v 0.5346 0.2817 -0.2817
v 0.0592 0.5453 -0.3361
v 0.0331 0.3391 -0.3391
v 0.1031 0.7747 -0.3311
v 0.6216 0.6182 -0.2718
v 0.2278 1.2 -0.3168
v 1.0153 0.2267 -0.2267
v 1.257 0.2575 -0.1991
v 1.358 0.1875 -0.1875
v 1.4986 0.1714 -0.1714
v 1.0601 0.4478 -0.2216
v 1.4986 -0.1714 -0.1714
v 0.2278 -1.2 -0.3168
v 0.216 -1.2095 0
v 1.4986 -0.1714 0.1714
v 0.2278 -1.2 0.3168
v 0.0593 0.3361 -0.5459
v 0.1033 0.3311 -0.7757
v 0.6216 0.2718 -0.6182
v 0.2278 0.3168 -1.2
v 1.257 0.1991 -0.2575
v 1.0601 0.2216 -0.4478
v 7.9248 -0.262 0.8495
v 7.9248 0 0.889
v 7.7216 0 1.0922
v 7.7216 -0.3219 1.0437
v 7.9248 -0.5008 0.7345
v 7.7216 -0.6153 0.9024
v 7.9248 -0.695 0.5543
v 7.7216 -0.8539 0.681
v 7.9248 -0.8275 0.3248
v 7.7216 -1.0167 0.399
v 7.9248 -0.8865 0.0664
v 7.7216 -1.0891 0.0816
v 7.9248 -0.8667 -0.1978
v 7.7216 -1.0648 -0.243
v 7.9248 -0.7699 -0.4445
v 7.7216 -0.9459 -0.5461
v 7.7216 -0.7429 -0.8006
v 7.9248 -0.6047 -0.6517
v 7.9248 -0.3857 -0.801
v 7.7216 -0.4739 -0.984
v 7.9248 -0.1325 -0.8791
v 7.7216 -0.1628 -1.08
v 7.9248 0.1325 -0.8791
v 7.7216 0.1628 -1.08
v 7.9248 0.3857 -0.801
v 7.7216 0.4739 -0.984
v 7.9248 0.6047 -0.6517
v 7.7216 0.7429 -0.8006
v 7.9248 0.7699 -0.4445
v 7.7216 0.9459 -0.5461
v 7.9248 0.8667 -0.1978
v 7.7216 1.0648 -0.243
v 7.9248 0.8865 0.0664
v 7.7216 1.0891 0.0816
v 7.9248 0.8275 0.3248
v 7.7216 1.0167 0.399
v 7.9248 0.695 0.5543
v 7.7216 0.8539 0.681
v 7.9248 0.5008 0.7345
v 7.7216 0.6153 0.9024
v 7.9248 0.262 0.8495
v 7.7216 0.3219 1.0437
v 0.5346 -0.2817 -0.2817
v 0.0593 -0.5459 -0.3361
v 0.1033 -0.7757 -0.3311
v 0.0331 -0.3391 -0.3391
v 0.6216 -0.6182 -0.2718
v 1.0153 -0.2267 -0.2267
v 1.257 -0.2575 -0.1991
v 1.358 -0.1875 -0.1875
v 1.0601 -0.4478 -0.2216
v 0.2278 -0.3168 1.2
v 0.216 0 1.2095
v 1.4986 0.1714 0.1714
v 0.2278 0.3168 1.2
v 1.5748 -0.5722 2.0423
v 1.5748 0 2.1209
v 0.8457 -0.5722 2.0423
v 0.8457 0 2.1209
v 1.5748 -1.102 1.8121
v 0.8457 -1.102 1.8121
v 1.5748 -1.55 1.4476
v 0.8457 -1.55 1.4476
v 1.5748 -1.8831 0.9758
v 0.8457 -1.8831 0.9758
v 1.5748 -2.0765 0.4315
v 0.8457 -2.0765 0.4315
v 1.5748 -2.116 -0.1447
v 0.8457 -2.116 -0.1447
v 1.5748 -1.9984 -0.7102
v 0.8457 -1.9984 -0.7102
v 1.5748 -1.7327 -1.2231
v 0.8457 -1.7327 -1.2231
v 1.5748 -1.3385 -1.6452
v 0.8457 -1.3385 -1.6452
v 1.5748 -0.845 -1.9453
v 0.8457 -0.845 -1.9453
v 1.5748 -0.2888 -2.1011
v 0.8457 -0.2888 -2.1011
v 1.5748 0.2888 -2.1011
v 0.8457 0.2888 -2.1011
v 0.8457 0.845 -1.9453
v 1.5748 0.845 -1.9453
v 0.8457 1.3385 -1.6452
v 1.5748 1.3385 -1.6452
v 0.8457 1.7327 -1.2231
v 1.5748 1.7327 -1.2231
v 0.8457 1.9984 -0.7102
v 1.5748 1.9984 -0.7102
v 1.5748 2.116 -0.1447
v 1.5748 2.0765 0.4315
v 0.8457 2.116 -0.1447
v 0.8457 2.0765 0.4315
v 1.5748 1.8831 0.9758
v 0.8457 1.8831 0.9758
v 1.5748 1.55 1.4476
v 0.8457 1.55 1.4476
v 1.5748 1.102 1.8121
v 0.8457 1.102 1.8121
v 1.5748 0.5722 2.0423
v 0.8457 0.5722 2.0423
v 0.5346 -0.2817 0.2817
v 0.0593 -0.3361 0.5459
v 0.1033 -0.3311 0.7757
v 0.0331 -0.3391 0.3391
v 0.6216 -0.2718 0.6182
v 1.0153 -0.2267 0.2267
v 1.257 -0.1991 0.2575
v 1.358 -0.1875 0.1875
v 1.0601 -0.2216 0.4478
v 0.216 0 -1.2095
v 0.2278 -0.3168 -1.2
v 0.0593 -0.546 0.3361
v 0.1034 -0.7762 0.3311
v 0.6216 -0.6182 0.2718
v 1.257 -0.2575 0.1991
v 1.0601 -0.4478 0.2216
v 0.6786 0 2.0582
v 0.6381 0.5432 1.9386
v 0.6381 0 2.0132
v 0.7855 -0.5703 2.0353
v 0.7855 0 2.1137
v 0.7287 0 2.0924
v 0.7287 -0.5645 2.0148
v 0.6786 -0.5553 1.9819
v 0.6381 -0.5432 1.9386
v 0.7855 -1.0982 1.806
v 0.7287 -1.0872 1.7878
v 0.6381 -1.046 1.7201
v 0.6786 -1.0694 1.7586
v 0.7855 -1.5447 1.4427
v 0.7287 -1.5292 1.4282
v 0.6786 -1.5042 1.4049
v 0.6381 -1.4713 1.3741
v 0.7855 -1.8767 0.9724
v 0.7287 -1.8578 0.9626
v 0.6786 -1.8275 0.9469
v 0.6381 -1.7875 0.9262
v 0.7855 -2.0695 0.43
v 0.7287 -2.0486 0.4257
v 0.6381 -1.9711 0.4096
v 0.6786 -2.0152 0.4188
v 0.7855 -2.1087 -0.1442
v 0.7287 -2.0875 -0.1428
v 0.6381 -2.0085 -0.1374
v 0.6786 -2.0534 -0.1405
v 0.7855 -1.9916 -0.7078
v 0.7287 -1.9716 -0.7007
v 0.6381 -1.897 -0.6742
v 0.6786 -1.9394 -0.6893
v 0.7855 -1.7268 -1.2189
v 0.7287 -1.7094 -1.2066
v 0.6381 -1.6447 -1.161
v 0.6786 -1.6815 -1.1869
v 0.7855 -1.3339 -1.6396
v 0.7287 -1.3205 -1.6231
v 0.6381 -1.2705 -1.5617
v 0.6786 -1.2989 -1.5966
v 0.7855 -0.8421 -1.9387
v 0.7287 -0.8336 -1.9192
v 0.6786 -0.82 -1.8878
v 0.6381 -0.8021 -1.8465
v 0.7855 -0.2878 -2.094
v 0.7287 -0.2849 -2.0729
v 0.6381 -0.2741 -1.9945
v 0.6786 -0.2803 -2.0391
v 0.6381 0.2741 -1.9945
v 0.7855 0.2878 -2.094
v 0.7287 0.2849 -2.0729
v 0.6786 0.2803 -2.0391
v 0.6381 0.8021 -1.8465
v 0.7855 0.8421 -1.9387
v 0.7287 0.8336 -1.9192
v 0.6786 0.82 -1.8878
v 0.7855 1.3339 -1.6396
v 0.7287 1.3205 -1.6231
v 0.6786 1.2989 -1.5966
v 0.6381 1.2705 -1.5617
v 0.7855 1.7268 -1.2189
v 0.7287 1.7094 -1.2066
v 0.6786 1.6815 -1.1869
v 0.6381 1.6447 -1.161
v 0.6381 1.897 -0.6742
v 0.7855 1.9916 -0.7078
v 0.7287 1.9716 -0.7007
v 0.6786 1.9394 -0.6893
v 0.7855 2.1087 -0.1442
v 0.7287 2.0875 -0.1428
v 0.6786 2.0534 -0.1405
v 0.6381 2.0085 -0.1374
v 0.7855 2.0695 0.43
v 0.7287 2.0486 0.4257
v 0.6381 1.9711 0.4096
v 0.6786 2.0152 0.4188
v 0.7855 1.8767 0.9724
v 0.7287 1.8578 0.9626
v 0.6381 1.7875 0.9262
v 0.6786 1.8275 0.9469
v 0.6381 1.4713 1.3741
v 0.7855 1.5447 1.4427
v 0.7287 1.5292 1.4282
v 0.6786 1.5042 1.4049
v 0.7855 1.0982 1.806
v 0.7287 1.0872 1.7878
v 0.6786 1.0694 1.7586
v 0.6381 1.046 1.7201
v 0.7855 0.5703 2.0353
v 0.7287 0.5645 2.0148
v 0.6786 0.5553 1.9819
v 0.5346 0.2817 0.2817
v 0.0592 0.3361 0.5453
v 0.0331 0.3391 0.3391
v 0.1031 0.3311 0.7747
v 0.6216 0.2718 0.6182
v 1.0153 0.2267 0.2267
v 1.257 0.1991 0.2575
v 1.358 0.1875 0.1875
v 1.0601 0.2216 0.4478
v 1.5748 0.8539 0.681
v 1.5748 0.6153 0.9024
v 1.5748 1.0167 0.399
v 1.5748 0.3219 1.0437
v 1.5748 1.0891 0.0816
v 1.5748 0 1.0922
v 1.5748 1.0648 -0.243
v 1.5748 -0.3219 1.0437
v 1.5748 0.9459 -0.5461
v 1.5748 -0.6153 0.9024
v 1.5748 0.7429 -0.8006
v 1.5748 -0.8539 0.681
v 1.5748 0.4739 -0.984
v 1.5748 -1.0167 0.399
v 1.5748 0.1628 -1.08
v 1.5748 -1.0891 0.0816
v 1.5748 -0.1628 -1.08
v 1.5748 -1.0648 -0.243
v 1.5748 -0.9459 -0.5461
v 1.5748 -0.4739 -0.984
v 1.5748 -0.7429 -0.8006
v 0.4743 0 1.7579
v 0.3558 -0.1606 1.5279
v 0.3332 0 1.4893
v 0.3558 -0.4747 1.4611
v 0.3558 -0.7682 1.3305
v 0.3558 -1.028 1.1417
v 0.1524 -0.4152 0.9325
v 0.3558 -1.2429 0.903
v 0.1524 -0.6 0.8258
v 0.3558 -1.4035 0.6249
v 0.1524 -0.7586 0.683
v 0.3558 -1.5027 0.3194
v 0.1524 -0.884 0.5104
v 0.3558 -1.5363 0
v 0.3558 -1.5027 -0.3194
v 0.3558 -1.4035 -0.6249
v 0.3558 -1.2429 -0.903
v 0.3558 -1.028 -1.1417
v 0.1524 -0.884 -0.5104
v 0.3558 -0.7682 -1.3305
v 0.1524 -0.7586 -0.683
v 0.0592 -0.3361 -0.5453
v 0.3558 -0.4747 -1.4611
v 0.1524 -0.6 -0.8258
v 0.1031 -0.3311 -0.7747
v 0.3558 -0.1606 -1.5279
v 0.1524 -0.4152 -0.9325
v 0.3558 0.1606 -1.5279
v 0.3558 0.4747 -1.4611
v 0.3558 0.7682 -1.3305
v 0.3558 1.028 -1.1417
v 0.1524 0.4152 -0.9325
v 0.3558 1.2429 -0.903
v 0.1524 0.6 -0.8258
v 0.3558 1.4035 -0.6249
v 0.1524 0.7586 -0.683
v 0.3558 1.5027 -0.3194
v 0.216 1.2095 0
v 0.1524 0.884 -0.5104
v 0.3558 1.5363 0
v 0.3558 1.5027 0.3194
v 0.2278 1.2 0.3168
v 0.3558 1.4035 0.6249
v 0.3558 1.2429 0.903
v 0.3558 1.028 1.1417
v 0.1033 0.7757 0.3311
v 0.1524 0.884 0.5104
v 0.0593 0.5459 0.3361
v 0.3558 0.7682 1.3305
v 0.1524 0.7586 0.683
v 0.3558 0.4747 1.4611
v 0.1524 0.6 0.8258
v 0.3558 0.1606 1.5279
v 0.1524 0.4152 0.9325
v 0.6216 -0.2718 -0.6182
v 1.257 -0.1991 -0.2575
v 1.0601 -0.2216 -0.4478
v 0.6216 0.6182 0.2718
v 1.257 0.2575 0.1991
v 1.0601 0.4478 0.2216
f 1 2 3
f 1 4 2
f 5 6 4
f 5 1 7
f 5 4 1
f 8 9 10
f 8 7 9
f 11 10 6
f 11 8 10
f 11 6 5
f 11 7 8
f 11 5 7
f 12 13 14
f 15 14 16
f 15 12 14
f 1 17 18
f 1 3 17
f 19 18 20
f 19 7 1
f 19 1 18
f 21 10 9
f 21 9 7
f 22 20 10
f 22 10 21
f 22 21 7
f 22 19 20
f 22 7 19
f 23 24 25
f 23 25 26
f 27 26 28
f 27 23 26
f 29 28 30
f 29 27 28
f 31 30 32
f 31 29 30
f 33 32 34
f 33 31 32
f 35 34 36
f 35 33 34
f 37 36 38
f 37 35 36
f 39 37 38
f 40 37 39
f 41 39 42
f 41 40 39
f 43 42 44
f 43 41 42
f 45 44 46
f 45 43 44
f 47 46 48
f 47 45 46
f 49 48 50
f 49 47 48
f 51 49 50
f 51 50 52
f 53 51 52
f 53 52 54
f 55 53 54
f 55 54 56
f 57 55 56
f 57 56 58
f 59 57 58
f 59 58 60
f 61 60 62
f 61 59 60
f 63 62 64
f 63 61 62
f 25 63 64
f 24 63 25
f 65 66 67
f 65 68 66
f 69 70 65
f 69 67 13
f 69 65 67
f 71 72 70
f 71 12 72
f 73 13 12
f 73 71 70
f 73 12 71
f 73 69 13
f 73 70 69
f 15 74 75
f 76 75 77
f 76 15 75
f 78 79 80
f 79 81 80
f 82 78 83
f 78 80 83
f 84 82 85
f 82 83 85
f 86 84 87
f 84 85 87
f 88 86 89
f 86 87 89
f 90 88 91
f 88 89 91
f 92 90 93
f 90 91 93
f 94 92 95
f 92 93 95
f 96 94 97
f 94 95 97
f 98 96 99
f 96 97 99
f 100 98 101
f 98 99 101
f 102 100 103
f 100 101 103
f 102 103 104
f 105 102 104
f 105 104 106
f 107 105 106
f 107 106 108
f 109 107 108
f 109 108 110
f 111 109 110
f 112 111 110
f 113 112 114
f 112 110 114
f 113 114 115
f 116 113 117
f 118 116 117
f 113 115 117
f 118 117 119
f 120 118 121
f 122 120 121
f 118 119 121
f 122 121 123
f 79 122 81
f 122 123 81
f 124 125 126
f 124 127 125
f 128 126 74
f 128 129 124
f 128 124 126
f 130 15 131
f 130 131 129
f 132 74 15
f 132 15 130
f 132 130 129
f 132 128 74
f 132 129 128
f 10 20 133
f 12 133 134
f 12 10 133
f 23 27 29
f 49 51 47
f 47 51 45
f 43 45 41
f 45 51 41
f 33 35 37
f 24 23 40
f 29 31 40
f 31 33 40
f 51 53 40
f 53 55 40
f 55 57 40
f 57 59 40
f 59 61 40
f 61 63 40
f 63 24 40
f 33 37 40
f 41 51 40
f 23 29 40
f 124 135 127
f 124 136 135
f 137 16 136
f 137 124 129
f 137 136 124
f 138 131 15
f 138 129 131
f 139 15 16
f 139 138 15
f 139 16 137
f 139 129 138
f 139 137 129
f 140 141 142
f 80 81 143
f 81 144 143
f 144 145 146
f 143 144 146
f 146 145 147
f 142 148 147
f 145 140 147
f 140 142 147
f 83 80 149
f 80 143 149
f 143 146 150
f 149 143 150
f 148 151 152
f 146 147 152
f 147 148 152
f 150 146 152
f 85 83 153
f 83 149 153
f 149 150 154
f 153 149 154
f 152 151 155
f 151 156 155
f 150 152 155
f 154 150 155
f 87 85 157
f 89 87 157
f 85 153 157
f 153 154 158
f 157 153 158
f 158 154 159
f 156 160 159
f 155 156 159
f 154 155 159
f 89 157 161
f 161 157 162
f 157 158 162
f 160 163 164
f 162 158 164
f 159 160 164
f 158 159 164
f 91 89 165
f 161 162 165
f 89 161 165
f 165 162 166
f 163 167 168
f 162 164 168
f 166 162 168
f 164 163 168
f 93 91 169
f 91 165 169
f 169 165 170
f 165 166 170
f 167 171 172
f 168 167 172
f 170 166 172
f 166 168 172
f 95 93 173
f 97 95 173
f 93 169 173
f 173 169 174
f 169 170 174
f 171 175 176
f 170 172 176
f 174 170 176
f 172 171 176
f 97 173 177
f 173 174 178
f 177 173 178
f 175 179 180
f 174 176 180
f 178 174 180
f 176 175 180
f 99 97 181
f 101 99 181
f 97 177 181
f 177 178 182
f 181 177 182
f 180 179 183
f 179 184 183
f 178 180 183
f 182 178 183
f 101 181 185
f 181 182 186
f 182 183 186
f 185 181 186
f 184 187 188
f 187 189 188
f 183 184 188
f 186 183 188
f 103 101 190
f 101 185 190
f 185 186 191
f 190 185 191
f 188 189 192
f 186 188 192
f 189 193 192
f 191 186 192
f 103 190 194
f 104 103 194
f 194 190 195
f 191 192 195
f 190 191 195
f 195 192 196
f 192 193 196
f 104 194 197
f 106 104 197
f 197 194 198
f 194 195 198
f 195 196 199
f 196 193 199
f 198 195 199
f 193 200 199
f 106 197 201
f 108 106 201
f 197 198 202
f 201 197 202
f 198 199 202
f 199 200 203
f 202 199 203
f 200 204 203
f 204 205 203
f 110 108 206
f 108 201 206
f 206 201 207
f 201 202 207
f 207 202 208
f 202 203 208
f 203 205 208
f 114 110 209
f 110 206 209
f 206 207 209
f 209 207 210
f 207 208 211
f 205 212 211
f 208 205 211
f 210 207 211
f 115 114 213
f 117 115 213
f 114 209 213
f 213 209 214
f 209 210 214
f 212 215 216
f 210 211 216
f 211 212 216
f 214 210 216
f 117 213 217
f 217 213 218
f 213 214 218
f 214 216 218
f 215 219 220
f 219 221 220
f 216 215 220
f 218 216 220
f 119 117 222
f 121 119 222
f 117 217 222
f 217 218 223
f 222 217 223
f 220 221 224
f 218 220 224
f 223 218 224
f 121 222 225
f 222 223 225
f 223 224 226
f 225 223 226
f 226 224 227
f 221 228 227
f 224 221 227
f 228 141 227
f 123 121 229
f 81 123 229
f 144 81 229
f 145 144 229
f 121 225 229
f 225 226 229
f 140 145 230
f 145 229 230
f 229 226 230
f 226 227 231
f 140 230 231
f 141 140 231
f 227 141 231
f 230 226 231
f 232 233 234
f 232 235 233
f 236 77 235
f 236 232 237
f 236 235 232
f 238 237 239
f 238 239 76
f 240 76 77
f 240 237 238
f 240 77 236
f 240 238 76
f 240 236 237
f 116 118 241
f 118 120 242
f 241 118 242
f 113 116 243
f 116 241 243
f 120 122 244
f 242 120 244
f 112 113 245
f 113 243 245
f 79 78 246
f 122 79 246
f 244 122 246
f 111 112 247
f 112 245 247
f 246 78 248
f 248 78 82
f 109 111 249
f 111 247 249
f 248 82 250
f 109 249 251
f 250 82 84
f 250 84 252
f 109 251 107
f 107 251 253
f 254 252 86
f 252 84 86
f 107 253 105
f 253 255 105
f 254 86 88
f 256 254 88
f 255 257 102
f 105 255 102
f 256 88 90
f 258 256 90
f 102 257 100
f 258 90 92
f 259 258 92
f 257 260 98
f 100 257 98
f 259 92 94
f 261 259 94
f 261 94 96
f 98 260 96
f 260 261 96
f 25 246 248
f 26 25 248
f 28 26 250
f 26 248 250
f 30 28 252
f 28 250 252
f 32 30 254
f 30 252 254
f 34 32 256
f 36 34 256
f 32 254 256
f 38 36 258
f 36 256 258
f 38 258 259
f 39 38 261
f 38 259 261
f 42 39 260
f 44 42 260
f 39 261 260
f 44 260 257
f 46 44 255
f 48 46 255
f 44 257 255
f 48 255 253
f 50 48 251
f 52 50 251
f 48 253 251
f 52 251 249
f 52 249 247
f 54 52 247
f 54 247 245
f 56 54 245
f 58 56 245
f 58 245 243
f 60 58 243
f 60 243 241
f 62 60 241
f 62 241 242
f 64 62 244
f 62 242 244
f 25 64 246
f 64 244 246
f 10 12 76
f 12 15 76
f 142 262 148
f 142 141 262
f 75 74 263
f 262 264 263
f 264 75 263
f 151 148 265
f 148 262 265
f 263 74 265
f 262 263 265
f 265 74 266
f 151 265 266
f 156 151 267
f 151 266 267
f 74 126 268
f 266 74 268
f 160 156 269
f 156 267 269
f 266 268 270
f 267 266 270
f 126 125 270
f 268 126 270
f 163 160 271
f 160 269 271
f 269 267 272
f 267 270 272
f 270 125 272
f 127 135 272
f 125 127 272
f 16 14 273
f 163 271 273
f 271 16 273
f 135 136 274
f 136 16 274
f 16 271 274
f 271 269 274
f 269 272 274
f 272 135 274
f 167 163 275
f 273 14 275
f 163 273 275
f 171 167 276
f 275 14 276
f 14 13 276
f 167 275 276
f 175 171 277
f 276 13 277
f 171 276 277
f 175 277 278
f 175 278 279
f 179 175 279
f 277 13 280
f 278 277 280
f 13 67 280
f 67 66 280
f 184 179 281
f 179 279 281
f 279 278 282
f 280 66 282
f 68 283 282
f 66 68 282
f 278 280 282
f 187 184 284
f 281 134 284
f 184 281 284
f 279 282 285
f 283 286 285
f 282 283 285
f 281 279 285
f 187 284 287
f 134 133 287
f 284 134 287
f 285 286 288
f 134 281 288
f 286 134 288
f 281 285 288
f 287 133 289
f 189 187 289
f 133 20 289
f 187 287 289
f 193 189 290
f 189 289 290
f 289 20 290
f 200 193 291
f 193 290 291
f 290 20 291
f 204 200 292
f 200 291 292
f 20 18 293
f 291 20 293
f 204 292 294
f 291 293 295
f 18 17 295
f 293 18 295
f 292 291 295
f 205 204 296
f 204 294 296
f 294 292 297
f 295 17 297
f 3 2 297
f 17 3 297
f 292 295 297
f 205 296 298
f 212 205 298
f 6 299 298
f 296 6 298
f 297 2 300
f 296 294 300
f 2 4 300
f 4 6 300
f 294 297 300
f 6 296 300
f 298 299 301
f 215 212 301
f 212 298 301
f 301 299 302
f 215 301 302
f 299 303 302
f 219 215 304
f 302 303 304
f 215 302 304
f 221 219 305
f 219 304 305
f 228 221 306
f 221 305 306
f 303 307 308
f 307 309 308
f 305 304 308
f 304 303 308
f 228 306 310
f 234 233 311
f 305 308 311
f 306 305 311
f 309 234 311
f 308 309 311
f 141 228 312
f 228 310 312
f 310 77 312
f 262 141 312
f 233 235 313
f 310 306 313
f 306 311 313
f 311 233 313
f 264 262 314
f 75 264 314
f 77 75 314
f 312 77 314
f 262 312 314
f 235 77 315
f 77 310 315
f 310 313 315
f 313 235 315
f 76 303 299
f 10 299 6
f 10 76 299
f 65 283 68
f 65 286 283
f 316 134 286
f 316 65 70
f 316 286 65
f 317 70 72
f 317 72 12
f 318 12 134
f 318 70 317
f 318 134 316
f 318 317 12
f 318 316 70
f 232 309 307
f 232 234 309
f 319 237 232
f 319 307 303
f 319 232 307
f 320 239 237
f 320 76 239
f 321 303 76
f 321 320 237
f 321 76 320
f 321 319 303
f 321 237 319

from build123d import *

# Parameters (mm, degrees)
CIRPATTERN1_COUNT = 2
CIRPATTERN1_ANGLE = 90
CHAMFER1_SIZE     = 0.2032


with BuildPart() as part:
    # BodySke → Base-Revolve (revolve)
    with BuildSketch(Plane.XY, mode=Mode.PRIVATE) as base_revolve_sk:
        with BuildLine():
            Line((1.5748, 1.0922), (1.5748, 2.1209))
            Line((1.5748, 2.1209), (0.845695803, 2.1209))
            ThreePointArc((0.845695803, 2.1209), (0.728748015, 2.09237553), (0.638066948, 2.013208777))
            ThreePointArc((0.638066948, 2.013208777), (0.163333253, 1.05595206), (0, 0))
            Line((0, 0), (7.9248, 0))
            Line((7.9248, 0), (7.9248, 1.0922))
            Line((7.9248, 1.0922), (1.5748, 1.0922))
        make_face()
    revolve(base_revolve_sk.sketch.rotate(Axis((-25.4, 0, 0), (1, 0, 0)), 90), axis=Axis((-25.4, 0, 0), (1, 0, 0)))

    # Sketch3 → Cut-Loft1 section 0
    with BuildSketch(Plane(origin=(0, 0, 0), x_dir=(0, 0, -1), z_dir=(1, 0, 0))):
        with BuildLine():
            Line((0.3429, -1.3843), (-0.3429, -1.3843))
            Line((-0.3429, -1.3843), (-0.3429, 1.3843))
            Line((-0.3429, 1.3843), (0.3429, 1.3843))
            Line((0.3429, 1.3843), (0.3429, -1.3843))
        make_face()
    # Sketch4 → Cut-Loft1 section 1
    with BuildSketch(Plane(origin=(1.4986, 0, 0), x_dir=(0, 0, -1), z_dir=(1, 0, 0))):
        with BuildLine():
            Line((0.17145, -0.17145), (-0.17145, -0.17145))
            Line((-0.17145, -0.17145), (-0.17145, 0.17145))
            Line((-0.17145, 0.17145), (0.17145, 0.17145))
            Line((0.17145, 0.17145), (0.17145, -0.17145))
        make_face()
    cut_loft1 = loft(mode=Mode.SUBTRACT)

    # CirPattern1: Cut-Loft1 ×2 about axis
    cirpattern1_axis = Axis((0, 0, 0), (1, 0, 0))
    for i in range(1, CIRPATTERN1_COUNT):
        add(cut_loft1.rotate(cirpattern1_axis, i * CIRPATTERN1_ANGLE / (CIRPATTERN1_COUNT - 1)), mode=Mode.SUBTRACT)

    # Chamfer1
    chamfer1_edges = [part.edges().sort_by_distance(p)[0] for p in [
        (7.9248, 0, -1.0922),
    ]]
    chamfer(chamfer1_edges, length=CHAMFER1_SIZE)


solid = part.part
